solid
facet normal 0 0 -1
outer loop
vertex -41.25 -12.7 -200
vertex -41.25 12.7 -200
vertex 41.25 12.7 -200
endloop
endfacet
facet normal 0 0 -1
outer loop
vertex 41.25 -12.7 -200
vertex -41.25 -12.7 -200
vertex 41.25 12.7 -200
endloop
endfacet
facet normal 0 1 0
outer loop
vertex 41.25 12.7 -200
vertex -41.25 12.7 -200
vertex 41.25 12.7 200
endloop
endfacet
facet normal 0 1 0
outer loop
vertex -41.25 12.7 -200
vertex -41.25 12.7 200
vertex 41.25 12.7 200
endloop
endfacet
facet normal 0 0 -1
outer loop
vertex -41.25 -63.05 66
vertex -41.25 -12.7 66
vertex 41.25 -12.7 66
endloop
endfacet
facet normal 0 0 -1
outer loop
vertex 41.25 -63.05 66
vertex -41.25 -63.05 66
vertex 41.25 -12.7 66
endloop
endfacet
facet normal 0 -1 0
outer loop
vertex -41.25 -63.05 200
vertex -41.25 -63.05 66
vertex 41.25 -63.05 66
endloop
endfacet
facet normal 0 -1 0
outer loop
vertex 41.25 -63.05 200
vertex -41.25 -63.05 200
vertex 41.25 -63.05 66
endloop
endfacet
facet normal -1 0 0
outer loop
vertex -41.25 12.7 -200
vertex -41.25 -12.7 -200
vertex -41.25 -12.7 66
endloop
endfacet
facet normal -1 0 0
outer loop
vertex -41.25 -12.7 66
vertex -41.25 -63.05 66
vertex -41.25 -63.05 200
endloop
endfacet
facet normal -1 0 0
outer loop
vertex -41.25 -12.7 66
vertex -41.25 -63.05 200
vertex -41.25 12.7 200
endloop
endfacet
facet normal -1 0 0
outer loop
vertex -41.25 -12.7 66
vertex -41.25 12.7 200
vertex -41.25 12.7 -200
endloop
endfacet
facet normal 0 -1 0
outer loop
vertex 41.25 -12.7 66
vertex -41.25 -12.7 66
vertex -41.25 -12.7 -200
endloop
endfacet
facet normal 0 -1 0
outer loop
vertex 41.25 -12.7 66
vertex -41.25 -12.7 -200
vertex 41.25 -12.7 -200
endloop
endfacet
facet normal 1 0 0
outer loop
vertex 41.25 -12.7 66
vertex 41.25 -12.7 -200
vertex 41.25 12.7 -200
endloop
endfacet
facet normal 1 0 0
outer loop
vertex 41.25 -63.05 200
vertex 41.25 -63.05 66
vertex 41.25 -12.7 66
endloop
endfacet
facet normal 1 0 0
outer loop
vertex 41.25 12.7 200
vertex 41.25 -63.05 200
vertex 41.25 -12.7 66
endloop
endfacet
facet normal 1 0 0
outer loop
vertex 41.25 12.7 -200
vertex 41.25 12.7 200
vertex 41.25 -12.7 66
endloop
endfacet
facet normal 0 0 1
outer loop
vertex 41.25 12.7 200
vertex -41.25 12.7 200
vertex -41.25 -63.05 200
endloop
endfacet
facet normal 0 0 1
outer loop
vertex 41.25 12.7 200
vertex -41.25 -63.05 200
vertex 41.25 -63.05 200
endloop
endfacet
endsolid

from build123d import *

# Parameters (mm, degrees)
F0_W     = 82.5
F0_H     = 25.4
F1_DEPTH = 200
F2_W     = 82.5
F2_H     = 134
F3_DEPTH = 50.35
F4_DEPTH = 200


with BuildPart() as f1:
    # F0 (on Top) → F1 (new body)
    with BuildSketch(Plane.XY):
        Rectangle(F0_W, F0_H)
    extrude(amount=F1_DEPTH)

    # F2 (on face) → F3 (join)
    with BuildSketch(Plane.XZ.offset(12.7)):
        with Locations((0, 133)):
            Rectangle(F2_W, F2_H)
    extrude(amount=F3_DEPTH)

    # F4 (add): a face of the model
    f4_faces = [f1.faces().sort_by_distance(p)[0] for p in [
        (0, 0, 0),
    ]]
    extrude(f4_faces, amount=F4_DEPTH)


solid = f1.part
